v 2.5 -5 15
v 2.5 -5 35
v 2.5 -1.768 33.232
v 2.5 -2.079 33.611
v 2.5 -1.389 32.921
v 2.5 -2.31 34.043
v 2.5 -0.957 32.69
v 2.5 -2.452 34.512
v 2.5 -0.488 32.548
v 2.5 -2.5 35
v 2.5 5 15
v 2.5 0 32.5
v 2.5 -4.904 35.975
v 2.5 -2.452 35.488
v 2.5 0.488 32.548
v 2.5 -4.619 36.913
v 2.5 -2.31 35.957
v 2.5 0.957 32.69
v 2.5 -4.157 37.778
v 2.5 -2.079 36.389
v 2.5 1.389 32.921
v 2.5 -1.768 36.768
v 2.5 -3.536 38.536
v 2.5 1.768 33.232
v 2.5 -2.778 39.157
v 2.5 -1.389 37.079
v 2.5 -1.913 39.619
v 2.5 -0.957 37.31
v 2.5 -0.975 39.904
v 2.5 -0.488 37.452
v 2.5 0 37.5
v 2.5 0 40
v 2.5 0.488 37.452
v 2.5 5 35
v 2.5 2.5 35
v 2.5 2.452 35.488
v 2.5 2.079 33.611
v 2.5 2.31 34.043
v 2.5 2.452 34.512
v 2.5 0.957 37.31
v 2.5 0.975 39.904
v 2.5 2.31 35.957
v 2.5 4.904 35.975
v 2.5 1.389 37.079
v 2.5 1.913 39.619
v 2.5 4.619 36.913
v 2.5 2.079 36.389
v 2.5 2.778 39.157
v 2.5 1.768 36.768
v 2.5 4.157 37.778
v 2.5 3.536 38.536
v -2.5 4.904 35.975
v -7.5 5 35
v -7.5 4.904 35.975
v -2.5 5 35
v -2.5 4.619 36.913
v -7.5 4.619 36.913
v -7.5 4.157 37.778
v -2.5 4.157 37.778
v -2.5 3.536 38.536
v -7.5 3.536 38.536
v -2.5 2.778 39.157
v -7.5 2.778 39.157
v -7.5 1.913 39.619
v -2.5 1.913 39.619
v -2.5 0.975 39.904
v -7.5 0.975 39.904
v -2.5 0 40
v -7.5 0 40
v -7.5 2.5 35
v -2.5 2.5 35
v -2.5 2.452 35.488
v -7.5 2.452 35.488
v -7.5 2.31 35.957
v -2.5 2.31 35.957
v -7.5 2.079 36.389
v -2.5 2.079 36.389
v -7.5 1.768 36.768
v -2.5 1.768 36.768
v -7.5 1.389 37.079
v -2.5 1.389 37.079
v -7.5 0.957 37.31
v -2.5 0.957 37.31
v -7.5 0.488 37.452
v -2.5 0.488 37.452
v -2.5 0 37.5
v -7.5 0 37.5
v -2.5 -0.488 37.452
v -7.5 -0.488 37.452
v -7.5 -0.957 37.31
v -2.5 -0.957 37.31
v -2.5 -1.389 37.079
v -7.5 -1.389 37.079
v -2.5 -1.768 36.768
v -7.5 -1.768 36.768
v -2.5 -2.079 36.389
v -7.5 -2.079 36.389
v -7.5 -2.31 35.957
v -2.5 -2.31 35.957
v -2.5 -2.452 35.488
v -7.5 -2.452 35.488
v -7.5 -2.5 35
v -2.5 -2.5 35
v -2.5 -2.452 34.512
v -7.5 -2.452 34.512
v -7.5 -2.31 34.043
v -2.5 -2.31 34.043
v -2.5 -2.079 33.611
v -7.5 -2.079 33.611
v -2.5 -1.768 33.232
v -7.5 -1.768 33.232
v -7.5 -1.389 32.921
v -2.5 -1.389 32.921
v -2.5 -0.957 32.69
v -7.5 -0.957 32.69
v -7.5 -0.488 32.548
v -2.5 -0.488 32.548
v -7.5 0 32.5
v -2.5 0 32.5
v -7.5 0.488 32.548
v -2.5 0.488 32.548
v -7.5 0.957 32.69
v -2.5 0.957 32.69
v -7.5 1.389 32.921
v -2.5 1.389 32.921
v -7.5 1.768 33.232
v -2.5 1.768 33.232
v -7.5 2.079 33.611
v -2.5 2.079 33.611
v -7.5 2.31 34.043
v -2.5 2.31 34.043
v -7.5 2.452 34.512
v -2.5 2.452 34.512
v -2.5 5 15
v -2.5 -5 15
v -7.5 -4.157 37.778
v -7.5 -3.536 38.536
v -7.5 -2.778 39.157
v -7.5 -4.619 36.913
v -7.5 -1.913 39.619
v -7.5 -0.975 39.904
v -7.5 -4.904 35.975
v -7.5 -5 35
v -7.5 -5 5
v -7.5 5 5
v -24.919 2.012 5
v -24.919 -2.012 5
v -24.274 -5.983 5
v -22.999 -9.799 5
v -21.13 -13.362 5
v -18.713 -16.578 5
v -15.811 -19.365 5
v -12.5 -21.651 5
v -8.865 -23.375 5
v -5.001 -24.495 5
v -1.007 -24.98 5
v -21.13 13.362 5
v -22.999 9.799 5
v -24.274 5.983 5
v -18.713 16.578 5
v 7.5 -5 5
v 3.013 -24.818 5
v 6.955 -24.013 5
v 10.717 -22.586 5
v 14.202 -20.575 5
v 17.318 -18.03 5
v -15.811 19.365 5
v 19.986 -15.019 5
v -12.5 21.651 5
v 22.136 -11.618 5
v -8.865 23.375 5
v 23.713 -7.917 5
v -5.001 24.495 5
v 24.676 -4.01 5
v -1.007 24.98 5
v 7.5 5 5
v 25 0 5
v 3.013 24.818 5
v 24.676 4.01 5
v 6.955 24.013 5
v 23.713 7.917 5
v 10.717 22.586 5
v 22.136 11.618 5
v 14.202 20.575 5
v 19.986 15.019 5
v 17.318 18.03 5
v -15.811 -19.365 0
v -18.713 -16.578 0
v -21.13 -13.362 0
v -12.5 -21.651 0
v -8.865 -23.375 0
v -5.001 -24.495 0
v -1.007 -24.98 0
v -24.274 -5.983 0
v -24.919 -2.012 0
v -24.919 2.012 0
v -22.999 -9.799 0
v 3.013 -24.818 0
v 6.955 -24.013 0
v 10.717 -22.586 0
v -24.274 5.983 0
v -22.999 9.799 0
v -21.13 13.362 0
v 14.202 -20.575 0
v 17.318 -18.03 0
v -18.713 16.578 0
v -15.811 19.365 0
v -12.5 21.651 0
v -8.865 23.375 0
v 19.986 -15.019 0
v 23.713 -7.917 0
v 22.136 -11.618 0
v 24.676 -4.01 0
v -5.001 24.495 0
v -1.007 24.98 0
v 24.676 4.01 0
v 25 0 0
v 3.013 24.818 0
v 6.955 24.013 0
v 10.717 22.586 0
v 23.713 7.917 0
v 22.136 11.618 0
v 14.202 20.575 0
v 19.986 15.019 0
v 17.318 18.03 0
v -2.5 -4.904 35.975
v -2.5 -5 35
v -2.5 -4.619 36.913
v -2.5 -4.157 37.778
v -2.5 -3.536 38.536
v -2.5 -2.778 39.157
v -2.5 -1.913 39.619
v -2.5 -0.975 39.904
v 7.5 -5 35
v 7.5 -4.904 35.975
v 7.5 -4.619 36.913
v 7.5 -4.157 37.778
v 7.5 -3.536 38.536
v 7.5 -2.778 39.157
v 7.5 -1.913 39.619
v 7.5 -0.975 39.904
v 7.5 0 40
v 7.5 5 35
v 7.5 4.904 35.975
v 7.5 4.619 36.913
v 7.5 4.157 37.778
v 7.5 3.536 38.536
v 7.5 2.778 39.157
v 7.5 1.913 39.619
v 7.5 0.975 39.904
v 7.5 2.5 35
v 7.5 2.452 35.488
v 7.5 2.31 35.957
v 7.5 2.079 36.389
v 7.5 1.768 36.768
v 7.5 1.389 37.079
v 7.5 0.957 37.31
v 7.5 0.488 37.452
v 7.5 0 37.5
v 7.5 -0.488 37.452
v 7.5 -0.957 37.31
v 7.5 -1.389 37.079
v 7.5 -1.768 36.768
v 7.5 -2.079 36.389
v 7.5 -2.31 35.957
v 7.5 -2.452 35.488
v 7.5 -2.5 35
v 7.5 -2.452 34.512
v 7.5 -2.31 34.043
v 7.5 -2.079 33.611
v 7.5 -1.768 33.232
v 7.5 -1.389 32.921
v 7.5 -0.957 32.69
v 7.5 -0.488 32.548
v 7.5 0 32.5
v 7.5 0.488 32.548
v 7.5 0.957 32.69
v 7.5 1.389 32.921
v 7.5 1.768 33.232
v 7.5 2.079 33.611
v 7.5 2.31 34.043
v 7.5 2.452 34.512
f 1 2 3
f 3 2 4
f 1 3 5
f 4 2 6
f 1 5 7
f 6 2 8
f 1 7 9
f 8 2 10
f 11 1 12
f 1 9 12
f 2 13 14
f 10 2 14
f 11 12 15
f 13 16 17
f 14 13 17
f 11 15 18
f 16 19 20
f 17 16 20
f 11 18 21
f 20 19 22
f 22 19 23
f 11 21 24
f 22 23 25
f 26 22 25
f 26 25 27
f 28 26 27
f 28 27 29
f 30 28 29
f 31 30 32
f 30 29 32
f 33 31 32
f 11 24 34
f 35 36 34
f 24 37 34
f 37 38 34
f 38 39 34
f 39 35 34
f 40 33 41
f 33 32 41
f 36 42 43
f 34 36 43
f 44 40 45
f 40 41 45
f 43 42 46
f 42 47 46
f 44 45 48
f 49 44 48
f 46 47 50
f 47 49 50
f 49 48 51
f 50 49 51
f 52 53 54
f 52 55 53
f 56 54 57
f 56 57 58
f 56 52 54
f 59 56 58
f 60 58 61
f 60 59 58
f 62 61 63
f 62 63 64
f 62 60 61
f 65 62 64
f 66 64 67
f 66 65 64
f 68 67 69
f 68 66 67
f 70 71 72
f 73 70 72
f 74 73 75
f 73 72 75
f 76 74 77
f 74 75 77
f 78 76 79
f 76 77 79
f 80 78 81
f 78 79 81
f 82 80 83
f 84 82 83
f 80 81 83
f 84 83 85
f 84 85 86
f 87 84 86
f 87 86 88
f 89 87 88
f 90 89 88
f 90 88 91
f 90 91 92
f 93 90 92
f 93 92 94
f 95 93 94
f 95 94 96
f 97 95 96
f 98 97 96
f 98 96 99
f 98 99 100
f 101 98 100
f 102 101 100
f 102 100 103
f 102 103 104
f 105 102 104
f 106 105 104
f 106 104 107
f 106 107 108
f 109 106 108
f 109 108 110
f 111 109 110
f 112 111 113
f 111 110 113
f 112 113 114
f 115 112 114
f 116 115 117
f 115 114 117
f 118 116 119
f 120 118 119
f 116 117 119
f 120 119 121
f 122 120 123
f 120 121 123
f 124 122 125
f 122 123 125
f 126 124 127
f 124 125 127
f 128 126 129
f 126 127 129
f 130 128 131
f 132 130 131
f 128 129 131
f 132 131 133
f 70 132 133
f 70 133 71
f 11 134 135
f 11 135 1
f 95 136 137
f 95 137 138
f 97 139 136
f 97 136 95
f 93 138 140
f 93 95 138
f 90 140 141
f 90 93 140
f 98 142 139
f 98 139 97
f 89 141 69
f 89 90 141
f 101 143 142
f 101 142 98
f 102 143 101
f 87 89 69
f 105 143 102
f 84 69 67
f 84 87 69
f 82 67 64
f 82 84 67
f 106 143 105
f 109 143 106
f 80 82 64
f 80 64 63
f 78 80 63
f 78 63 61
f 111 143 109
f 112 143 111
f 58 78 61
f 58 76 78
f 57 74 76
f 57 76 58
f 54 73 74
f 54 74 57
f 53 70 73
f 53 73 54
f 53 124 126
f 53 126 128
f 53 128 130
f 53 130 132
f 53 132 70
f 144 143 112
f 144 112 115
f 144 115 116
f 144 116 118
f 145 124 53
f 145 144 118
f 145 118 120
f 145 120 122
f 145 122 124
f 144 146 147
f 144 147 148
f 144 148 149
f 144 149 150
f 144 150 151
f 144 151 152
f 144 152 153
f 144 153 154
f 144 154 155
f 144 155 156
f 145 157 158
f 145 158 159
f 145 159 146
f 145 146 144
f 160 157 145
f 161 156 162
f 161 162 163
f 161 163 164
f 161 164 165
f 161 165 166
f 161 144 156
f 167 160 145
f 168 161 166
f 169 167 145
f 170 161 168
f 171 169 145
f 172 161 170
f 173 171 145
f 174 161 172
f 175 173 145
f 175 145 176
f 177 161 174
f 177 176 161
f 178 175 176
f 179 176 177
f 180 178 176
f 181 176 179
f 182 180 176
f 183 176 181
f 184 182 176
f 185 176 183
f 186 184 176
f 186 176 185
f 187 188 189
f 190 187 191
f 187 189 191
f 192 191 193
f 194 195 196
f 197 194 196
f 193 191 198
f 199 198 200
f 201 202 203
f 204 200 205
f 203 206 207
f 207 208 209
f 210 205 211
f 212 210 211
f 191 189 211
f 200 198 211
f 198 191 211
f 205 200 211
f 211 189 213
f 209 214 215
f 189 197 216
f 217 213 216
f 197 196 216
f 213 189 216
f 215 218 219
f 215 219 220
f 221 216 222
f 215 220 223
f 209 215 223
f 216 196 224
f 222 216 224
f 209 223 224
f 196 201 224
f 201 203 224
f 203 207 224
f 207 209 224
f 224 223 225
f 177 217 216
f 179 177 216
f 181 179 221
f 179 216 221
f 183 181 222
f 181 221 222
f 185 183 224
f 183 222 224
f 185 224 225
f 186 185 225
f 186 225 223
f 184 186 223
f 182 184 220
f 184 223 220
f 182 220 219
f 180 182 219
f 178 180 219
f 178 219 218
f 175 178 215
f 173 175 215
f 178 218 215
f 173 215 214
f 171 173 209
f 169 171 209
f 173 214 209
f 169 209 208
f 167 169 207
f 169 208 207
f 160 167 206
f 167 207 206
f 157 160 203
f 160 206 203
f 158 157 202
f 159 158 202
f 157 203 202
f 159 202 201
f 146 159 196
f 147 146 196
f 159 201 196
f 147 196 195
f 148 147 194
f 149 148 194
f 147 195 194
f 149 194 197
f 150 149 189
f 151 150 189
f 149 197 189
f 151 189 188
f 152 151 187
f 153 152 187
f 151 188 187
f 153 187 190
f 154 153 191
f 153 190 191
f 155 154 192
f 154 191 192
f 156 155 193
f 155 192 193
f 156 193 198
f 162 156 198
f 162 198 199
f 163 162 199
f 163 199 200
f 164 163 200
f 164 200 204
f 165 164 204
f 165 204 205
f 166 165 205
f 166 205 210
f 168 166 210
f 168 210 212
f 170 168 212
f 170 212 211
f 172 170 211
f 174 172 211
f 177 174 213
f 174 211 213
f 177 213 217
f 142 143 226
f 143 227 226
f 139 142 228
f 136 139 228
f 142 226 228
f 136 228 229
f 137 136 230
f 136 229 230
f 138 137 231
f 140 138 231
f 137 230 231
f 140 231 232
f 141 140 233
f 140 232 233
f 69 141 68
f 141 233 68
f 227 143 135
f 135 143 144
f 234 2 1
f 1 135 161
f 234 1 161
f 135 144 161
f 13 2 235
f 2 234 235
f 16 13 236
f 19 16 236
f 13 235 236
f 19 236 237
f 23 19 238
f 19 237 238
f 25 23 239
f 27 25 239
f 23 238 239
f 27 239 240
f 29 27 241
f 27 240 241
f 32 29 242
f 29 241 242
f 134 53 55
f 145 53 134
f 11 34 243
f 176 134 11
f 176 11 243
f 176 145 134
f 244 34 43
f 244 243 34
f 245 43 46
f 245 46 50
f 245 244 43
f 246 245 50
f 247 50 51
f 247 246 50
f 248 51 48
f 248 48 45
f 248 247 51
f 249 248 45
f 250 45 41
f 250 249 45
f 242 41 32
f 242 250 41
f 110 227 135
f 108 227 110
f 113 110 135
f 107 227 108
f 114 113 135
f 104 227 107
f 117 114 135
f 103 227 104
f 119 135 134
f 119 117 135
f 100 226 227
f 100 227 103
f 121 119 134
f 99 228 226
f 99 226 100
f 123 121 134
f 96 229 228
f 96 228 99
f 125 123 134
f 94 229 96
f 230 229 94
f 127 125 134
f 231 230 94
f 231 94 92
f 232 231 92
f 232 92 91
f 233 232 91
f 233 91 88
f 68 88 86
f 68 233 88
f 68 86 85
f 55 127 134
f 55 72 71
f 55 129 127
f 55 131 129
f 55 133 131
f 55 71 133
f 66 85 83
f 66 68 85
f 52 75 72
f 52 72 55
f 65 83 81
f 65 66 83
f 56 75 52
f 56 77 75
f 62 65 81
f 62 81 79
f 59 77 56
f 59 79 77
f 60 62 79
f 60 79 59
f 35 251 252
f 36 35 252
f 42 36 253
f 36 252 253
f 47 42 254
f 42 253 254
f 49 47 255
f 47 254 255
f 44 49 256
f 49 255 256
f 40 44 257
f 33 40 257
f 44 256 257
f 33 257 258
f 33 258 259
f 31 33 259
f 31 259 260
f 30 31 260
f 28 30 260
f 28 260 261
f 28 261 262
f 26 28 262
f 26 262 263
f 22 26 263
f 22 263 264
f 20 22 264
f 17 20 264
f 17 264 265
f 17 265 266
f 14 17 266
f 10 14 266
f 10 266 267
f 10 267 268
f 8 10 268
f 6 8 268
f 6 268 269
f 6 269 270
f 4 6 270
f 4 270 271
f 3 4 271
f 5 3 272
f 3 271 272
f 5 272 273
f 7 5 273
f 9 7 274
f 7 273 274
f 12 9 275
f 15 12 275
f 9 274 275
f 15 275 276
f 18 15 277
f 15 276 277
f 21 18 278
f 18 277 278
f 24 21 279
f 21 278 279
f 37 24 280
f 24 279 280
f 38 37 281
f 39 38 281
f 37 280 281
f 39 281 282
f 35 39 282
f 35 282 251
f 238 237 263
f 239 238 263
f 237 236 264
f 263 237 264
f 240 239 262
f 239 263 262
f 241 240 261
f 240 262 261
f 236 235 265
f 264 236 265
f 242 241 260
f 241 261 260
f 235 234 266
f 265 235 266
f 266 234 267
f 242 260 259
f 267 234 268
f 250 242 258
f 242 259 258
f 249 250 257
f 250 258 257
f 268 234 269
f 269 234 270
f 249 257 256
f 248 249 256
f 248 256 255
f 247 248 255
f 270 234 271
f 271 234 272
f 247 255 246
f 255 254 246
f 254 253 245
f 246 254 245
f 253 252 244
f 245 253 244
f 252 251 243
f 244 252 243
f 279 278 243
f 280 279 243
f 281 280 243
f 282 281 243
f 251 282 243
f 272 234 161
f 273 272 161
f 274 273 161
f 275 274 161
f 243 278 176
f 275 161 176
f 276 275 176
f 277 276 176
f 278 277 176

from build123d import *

# Parameters (mm, degrees)
F0_R     = 25
F2_DEPTH = 5
F1_W     = 15
F1_H     = 10
F3_DEPTH = 40
F4_W     = 5
F4_H     = 10
F5_DEPTH = 25
F6_R     = 2.5
F7_DEPTH = 32.501
F8_R     = 4.99999


# Not quite as in the source:
# - a fillet or chamfer is up to 0.001 mm smaller than in the source, because OpenCascade refuses the exact size


with BuildPart() as f2:
    # F0 (on Top) → F2 (new body)
    with BuildSketch(Plane.XY):
        Circle(F0_R)
    extrude(amount=F2_DEPTH)

    # F1 (on Top) → F3 (join)
    with BuildSketch(Plane.XY):
        Rectangle(F1_W, F1_H)
    extrude(amount=F3_DEPTH)

    # F4 (on face) → F5 (cut)
    with BuildSketch(Plane.XY.offset(40)):
        Rectangle(F4_W, F4_H)
    extrude(amount=-F5_DEPTH, mode=Mode.SUBTRACT)

    # F6 (on face) → F7 (cut, through all)
    with BuildSketch(Plane.YZ.offset(7.5)):
        with Locations((0, 35)):
            Circle(F6_R)
    extrude(amount=-F7_DEPTH, mode=Mode.SUBTRACT)

    # F8 (radius 5 in the source; OpenCascade refuses exactly that, so slightly less here)
    f8_edges = [f2.edges().sort_by_distance(p)[0] for p in [
        (-5, 5, 40),
        (-5, -5, 40),
        (5, 5, 40),
        (5, -5, 40),
    ]]
    fillet(f8_edges, radius=F8_R)


solid = f2.part
